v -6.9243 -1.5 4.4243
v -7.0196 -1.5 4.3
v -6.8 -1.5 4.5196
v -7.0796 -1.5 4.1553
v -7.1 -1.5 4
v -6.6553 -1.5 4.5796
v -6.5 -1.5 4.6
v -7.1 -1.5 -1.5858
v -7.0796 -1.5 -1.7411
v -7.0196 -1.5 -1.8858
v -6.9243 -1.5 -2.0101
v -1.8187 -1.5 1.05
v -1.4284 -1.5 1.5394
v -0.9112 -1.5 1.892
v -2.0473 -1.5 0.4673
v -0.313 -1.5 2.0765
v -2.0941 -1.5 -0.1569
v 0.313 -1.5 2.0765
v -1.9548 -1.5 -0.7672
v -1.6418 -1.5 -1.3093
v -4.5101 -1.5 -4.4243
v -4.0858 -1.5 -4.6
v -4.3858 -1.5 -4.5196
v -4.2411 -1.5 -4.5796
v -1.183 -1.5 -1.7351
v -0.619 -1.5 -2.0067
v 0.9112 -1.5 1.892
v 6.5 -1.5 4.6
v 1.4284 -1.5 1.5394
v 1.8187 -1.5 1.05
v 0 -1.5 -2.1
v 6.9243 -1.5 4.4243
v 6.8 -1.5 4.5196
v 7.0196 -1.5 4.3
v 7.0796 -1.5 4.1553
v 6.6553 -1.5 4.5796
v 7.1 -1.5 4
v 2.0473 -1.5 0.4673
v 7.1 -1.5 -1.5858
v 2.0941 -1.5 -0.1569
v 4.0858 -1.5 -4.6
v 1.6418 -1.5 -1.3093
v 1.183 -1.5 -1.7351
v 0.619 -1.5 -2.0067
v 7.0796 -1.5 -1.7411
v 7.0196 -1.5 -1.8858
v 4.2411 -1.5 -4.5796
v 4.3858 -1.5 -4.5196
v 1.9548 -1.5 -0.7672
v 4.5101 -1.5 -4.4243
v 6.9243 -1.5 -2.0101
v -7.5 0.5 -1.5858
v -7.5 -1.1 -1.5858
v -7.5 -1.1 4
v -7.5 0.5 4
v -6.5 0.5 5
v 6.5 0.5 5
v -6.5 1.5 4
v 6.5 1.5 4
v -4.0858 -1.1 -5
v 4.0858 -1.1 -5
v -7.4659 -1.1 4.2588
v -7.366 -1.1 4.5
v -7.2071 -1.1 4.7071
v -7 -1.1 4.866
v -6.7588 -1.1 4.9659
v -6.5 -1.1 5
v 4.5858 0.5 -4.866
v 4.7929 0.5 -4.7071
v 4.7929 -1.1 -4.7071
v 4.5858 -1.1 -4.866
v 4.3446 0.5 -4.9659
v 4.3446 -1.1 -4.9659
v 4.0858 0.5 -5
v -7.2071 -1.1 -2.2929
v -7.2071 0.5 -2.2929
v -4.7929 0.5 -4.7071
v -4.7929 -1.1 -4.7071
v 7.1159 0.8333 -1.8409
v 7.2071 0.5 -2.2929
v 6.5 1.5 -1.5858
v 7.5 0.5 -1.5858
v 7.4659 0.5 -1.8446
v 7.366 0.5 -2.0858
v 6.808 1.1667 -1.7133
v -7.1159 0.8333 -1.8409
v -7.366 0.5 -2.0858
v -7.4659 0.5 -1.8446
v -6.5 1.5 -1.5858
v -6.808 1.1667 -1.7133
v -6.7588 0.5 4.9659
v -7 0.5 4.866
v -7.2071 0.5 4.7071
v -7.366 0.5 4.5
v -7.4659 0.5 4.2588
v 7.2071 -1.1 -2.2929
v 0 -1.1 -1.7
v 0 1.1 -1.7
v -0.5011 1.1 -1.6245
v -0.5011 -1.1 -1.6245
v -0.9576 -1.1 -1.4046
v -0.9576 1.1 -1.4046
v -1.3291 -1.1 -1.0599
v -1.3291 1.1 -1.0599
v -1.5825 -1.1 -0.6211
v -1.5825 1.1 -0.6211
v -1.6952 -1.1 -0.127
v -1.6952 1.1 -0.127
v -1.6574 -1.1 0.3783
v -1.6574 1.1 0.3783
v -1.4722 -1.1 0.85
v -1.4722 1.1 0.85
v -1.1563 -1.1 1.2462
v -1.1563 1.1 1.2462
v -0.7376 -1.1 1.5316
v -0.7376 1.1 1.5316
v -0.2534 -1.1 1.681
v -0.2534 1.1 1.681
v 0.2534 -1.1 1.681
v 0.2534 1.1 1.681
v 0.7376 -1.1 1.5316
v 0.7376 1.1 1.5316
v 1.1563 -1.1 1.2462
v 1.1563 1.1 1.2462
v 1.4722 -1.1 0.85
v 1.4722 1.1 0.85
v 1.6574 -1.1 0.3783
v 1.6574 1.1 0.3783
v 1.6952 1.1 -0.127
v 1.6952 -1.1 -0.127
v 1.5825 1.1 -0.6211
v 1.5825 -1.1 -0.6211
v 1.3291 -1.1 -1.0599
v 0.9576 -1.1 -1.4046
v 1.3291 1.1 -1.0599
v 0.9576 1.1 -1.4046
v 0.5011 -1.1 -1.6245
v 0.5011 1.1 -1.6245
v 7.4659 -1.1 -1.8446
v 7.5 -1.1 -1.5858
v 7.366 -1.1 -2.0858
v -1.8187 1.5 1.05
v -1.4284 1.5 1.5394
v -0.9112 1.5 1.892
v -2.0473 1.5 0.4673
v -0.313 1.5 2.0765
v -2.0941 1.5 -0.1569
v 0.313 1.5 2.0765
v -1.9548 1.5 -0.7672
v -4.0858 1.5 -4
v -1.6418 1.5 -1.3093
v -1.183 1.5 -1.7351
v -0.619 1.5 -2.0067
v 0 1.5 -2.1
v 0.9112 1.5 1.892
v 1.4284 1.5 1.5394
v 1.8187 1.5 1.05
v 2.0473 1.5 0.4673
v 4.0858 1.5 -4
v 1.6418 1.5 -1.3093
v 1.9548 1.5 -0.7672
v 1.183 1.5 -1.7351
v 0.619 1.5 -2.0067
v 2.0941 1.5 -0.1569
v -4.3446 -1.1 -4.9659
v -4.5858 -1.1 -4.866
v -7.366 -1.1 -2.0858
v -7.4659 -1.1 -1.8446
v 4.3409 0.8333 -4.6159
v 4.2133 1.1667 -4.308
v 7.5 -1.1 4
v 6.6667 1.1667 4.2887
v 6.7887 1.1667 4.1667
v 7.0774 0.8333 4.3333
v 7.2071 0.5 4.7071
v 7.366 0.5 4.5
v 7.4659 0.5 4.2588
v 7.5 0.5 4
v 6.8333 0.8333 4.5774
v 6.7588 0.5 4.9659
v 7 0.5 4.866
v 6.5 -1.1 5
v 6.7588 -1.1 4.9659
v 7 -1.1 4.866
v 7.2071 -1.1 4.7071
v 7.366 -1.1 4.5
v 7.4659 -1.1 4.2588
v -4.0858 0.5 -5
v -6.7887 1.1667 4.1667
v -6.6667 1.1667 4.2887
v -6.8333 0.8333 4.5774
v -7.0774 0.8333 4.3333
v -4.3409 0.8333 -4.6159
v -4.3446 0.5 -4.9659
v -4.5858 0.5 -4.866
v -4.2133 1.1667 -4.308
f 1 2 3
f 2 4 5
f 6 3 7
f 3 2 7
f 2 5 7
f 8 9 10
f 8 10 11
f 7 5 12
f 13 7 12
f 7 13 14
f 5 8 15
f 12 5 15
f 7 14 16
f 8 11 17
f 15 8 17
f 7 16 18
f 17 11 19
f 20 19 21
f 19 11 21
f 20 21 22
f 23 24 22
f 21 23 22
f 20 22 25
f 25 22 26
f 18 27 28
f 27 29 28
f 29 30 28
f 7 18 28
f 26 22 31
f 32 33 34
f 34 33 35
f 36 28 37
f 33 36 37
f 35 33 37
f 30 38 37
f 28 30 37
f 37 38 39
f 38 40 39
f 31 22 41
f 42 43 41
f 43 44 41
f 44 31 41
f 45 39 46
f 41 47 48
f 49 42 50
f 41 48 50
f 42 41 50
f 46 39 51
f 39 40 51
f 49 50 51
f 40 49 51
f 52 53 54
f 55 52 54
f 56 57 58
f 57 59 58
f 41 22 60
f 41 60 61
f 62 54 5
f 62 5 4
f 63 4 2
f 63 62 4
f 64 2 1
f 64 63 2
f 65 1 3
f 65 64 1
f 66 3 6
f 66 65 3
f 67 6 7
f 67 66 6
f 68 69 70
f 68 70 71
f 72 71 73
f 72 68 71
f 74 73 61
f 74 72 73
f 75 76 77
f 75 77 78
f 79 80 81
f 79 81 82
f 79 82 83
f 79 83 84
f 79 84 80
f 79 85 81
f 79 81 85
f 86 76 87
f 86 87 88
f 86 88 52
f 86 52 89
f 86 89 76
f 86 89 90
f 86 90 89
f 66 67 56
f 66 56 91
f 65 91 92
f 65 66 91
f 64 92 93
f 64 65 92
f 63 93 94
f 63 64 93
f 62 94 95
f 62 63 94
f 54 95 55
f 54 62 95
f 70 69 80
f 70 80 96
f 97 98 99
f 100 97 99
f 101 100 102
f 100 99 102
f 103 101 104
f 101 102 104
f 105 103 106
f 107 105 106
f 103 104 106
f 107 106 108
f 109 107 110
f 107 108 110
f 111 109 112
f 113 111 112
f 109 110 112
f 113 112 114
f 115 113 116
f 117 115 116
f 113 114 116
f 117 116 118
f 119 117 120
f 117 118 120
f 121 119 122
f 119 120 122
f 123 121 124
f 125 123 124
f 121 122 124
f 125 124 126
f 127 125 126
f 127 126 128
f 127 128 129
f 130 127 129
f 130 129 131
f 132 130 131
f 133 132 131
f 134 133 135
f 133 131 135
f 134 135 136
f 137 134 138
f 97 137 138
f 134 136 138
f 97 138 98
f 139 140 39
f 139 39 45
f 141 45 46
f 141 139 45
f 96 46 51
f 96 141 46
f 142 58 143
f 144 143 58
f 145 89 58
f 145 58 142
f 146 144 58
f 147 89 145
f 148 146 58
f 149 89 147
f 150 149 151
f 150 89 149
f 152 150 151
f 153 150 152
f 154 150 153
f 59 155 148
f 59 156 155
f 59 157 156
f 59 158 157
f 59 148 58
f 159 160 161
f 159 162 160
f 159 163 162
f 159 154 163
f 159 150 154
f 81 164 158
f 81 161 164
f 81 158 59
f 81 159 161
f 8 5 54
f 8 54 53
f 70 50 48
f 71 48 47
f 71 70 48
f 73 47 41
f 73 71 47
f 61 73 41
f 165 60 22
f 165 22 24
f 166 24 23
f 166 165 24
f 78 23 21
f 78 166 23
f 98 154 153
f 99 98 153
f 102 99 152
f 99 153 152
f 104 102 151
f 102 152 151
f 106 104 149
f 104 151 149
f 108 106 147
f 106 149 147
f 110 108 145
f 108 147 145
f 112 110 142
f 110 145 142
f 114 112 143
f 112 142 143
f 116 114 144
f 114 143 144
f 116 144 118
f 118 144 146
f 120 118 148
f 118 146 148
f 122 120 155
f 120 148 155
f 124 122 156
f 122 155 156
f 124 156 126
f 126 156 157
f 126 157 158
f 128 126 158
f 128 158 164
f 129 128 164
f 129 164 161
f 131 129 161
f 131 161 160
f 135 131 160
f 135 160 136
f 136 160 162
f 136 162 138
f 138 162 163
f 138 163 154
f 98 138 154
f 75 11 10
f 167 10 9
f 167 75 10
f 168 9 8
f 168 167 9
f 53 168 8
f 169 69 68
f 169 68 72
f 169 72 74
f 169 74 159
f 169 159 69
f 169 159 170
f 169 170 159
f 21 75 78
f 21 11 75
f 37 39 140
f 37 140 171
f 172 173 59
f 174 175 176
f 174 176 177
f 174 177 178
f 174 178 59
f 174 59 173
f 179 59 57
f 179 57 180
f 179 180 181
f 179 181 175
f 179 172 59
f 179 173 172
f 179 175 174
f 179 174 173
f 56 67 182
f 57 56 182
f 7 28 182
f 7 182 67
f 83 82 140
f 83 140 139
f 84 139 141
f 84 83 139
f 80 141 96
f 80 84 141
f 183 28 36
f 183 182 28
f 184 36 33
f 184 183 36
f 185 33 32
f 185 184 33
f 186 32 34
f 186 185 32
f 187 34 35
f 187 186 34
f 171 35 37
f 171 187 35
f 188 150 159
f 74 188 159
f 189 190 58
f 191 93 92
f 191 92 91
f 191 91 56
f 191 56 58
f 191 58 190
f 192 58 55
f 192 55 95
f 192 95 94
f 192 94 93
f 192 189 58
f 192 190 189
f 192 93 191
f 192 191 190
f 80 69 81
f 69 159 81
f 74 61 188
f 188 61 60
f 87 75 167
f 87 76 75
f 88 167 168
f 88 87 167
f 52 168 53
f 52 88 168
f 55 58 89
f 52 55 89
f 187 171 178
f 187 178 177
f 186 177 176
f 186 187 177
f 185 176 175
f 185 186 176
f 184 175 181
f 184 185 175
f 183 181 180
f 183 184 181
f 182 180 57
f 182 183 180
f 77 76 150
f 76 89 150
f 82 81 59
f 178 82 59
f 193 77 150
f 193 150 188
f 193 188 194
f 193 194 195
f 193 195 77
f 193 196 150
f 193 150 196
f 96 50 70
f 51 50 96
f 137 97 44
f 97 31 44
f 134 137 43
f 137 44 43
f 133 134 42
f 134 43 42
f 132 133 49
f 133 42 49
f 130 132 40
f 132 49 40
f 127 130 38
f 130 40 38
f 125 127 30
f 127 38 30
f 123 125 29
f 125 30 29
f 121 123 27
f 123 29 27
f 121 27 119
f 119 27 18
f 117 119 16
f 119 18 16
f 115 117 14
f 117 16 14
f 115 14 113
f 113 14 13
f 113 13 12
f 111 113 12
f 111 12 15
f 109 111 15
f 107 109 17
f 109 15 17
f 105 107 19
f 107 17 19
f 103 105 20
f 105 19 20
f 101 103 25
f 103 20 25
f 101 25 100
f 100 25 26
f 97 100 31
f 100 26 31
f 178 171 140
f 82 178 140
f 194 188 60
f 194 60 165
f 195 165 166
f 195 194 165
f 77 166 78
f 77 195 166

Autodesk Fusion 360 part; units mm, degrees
sketch "Sketch1" plane through (0, 0, 0) normal (0, 1, 0) x (1, 0, 0) in component "[a]_Railstops_x6"
  line L0 (7.5, 5) -> (-7.5, 5)
  line L1 (-7.5, 5) -> (-7.5, -5)
  line L2 (-7.5, -5) -> (7.5, -5)
  line L3 (7.5, -5) -> (7.5, 5)
  line L4 (7.5, 5) -> (-7.5, -5) construction
  line L5 (-7.5, 5) -> (7.5, -5) construction
  dimension "d1" = 15
  dimension "d2" = 10
extrude "Extrude1" add sketch "Sketch1" along normal mid plane 3 in component "[a]_Railstops_x6"
chamfer "Chamfer1" distance 3 angle 45 2 edges at (-7.5, 0, -5) (7.5, 0, -5) measured on face at (-2.5, 0.5, -5) measured on face at (7.5, -0.5, 1.6667) in component "[a]_Railstops_x6"
fillet "Fillet1" radius 1 6 edges at (7.5, 0, 5) (-7.5, 0, 5) (-7.5, 0, -2) (-4.5, 0, -5) (4.5, 0, -5) (7.5, 0, -2) in component "[a]_Railstops_x6"
chamfer "Chamfer2" distance 0.4 angle 45 1 faces at (-1.3619, -1.5, 1.6667) in component "[a]_Railstops_x6"
chamfer "Chamfer2" distance 1 angle 45 1 faces at (-1.3619, 1.5, 1.6667) in component "[a]_Railstops_x6"
sketch "Sketch2" plane through (0, -1.5, 0) normal (0, -1, 0) x (1, 0, 0) in component "[a]_Railstops_x6"
  arc A0 (6.9243, -2.0101) -> (7.1, -1.5858) centre (6.5, -1.5858) ccw
  line L0 (7.1, -1.5858) -> (7.1, 4)
  arc A1 (7.1, 4) -> (6.5, 4.6) centre (6.5, 4) ccw
  line L1 (6.5, 4.6) -> (-6.5, 4.6)
  arc A2 (-6.5, 4.6) -> (-7.1, 4) centre (-6.5, 4) ccw
  line L2 (-7.1, 4) -> (-7.1, -1.5858)
  arc A3 (-7.1, -1.5858) -> (-6.9243, -2.0101) centre (-6.5, -1.5858) ccw
  line L3 (-6.9243, -2.0101) -> (-4.5101, -4.4243)
  arc A4 (-4.5101, -4.4243) -> (-4.0858, -4.6) centre (-4.0858, -4) ccw
  line L4 (-4.0858, -4.6) -> (4.0858, -4.6)
  arc A5 (4.0858, -4.6) -> (4.5101, -4.4243) centre (4.0858, -4) ccw
  line L5 (4.5101, -4.4243) -> (6.9243, -2.0101)
  line L6 (0, 0) -> (0, 7) construction
  point P0 (0, 0.5)
  dimension "d16" = 0.5
hole "Hole1" at (0, -1.5, 0) direction (0, 1, 0) diameter 3.4 end through all in component "[a]_Railstops_x6"
chamfer "Chamfer3" distance 0.4 angle 45 2 edges at (0.6147, -1.5, 1.585) (-0.6147, 1.5, 1.585) measured on face at (-5.2858, -1.5, 0.9308) measured on face at (4.8858, 1.5, 0.9308) in component "[a]_Railstops_x6"
component "[a]_Railstops_x6" placed x (1, 0, 0) y (0, 1, 0) z (0, 0, 1) at (0, 0, 0)
